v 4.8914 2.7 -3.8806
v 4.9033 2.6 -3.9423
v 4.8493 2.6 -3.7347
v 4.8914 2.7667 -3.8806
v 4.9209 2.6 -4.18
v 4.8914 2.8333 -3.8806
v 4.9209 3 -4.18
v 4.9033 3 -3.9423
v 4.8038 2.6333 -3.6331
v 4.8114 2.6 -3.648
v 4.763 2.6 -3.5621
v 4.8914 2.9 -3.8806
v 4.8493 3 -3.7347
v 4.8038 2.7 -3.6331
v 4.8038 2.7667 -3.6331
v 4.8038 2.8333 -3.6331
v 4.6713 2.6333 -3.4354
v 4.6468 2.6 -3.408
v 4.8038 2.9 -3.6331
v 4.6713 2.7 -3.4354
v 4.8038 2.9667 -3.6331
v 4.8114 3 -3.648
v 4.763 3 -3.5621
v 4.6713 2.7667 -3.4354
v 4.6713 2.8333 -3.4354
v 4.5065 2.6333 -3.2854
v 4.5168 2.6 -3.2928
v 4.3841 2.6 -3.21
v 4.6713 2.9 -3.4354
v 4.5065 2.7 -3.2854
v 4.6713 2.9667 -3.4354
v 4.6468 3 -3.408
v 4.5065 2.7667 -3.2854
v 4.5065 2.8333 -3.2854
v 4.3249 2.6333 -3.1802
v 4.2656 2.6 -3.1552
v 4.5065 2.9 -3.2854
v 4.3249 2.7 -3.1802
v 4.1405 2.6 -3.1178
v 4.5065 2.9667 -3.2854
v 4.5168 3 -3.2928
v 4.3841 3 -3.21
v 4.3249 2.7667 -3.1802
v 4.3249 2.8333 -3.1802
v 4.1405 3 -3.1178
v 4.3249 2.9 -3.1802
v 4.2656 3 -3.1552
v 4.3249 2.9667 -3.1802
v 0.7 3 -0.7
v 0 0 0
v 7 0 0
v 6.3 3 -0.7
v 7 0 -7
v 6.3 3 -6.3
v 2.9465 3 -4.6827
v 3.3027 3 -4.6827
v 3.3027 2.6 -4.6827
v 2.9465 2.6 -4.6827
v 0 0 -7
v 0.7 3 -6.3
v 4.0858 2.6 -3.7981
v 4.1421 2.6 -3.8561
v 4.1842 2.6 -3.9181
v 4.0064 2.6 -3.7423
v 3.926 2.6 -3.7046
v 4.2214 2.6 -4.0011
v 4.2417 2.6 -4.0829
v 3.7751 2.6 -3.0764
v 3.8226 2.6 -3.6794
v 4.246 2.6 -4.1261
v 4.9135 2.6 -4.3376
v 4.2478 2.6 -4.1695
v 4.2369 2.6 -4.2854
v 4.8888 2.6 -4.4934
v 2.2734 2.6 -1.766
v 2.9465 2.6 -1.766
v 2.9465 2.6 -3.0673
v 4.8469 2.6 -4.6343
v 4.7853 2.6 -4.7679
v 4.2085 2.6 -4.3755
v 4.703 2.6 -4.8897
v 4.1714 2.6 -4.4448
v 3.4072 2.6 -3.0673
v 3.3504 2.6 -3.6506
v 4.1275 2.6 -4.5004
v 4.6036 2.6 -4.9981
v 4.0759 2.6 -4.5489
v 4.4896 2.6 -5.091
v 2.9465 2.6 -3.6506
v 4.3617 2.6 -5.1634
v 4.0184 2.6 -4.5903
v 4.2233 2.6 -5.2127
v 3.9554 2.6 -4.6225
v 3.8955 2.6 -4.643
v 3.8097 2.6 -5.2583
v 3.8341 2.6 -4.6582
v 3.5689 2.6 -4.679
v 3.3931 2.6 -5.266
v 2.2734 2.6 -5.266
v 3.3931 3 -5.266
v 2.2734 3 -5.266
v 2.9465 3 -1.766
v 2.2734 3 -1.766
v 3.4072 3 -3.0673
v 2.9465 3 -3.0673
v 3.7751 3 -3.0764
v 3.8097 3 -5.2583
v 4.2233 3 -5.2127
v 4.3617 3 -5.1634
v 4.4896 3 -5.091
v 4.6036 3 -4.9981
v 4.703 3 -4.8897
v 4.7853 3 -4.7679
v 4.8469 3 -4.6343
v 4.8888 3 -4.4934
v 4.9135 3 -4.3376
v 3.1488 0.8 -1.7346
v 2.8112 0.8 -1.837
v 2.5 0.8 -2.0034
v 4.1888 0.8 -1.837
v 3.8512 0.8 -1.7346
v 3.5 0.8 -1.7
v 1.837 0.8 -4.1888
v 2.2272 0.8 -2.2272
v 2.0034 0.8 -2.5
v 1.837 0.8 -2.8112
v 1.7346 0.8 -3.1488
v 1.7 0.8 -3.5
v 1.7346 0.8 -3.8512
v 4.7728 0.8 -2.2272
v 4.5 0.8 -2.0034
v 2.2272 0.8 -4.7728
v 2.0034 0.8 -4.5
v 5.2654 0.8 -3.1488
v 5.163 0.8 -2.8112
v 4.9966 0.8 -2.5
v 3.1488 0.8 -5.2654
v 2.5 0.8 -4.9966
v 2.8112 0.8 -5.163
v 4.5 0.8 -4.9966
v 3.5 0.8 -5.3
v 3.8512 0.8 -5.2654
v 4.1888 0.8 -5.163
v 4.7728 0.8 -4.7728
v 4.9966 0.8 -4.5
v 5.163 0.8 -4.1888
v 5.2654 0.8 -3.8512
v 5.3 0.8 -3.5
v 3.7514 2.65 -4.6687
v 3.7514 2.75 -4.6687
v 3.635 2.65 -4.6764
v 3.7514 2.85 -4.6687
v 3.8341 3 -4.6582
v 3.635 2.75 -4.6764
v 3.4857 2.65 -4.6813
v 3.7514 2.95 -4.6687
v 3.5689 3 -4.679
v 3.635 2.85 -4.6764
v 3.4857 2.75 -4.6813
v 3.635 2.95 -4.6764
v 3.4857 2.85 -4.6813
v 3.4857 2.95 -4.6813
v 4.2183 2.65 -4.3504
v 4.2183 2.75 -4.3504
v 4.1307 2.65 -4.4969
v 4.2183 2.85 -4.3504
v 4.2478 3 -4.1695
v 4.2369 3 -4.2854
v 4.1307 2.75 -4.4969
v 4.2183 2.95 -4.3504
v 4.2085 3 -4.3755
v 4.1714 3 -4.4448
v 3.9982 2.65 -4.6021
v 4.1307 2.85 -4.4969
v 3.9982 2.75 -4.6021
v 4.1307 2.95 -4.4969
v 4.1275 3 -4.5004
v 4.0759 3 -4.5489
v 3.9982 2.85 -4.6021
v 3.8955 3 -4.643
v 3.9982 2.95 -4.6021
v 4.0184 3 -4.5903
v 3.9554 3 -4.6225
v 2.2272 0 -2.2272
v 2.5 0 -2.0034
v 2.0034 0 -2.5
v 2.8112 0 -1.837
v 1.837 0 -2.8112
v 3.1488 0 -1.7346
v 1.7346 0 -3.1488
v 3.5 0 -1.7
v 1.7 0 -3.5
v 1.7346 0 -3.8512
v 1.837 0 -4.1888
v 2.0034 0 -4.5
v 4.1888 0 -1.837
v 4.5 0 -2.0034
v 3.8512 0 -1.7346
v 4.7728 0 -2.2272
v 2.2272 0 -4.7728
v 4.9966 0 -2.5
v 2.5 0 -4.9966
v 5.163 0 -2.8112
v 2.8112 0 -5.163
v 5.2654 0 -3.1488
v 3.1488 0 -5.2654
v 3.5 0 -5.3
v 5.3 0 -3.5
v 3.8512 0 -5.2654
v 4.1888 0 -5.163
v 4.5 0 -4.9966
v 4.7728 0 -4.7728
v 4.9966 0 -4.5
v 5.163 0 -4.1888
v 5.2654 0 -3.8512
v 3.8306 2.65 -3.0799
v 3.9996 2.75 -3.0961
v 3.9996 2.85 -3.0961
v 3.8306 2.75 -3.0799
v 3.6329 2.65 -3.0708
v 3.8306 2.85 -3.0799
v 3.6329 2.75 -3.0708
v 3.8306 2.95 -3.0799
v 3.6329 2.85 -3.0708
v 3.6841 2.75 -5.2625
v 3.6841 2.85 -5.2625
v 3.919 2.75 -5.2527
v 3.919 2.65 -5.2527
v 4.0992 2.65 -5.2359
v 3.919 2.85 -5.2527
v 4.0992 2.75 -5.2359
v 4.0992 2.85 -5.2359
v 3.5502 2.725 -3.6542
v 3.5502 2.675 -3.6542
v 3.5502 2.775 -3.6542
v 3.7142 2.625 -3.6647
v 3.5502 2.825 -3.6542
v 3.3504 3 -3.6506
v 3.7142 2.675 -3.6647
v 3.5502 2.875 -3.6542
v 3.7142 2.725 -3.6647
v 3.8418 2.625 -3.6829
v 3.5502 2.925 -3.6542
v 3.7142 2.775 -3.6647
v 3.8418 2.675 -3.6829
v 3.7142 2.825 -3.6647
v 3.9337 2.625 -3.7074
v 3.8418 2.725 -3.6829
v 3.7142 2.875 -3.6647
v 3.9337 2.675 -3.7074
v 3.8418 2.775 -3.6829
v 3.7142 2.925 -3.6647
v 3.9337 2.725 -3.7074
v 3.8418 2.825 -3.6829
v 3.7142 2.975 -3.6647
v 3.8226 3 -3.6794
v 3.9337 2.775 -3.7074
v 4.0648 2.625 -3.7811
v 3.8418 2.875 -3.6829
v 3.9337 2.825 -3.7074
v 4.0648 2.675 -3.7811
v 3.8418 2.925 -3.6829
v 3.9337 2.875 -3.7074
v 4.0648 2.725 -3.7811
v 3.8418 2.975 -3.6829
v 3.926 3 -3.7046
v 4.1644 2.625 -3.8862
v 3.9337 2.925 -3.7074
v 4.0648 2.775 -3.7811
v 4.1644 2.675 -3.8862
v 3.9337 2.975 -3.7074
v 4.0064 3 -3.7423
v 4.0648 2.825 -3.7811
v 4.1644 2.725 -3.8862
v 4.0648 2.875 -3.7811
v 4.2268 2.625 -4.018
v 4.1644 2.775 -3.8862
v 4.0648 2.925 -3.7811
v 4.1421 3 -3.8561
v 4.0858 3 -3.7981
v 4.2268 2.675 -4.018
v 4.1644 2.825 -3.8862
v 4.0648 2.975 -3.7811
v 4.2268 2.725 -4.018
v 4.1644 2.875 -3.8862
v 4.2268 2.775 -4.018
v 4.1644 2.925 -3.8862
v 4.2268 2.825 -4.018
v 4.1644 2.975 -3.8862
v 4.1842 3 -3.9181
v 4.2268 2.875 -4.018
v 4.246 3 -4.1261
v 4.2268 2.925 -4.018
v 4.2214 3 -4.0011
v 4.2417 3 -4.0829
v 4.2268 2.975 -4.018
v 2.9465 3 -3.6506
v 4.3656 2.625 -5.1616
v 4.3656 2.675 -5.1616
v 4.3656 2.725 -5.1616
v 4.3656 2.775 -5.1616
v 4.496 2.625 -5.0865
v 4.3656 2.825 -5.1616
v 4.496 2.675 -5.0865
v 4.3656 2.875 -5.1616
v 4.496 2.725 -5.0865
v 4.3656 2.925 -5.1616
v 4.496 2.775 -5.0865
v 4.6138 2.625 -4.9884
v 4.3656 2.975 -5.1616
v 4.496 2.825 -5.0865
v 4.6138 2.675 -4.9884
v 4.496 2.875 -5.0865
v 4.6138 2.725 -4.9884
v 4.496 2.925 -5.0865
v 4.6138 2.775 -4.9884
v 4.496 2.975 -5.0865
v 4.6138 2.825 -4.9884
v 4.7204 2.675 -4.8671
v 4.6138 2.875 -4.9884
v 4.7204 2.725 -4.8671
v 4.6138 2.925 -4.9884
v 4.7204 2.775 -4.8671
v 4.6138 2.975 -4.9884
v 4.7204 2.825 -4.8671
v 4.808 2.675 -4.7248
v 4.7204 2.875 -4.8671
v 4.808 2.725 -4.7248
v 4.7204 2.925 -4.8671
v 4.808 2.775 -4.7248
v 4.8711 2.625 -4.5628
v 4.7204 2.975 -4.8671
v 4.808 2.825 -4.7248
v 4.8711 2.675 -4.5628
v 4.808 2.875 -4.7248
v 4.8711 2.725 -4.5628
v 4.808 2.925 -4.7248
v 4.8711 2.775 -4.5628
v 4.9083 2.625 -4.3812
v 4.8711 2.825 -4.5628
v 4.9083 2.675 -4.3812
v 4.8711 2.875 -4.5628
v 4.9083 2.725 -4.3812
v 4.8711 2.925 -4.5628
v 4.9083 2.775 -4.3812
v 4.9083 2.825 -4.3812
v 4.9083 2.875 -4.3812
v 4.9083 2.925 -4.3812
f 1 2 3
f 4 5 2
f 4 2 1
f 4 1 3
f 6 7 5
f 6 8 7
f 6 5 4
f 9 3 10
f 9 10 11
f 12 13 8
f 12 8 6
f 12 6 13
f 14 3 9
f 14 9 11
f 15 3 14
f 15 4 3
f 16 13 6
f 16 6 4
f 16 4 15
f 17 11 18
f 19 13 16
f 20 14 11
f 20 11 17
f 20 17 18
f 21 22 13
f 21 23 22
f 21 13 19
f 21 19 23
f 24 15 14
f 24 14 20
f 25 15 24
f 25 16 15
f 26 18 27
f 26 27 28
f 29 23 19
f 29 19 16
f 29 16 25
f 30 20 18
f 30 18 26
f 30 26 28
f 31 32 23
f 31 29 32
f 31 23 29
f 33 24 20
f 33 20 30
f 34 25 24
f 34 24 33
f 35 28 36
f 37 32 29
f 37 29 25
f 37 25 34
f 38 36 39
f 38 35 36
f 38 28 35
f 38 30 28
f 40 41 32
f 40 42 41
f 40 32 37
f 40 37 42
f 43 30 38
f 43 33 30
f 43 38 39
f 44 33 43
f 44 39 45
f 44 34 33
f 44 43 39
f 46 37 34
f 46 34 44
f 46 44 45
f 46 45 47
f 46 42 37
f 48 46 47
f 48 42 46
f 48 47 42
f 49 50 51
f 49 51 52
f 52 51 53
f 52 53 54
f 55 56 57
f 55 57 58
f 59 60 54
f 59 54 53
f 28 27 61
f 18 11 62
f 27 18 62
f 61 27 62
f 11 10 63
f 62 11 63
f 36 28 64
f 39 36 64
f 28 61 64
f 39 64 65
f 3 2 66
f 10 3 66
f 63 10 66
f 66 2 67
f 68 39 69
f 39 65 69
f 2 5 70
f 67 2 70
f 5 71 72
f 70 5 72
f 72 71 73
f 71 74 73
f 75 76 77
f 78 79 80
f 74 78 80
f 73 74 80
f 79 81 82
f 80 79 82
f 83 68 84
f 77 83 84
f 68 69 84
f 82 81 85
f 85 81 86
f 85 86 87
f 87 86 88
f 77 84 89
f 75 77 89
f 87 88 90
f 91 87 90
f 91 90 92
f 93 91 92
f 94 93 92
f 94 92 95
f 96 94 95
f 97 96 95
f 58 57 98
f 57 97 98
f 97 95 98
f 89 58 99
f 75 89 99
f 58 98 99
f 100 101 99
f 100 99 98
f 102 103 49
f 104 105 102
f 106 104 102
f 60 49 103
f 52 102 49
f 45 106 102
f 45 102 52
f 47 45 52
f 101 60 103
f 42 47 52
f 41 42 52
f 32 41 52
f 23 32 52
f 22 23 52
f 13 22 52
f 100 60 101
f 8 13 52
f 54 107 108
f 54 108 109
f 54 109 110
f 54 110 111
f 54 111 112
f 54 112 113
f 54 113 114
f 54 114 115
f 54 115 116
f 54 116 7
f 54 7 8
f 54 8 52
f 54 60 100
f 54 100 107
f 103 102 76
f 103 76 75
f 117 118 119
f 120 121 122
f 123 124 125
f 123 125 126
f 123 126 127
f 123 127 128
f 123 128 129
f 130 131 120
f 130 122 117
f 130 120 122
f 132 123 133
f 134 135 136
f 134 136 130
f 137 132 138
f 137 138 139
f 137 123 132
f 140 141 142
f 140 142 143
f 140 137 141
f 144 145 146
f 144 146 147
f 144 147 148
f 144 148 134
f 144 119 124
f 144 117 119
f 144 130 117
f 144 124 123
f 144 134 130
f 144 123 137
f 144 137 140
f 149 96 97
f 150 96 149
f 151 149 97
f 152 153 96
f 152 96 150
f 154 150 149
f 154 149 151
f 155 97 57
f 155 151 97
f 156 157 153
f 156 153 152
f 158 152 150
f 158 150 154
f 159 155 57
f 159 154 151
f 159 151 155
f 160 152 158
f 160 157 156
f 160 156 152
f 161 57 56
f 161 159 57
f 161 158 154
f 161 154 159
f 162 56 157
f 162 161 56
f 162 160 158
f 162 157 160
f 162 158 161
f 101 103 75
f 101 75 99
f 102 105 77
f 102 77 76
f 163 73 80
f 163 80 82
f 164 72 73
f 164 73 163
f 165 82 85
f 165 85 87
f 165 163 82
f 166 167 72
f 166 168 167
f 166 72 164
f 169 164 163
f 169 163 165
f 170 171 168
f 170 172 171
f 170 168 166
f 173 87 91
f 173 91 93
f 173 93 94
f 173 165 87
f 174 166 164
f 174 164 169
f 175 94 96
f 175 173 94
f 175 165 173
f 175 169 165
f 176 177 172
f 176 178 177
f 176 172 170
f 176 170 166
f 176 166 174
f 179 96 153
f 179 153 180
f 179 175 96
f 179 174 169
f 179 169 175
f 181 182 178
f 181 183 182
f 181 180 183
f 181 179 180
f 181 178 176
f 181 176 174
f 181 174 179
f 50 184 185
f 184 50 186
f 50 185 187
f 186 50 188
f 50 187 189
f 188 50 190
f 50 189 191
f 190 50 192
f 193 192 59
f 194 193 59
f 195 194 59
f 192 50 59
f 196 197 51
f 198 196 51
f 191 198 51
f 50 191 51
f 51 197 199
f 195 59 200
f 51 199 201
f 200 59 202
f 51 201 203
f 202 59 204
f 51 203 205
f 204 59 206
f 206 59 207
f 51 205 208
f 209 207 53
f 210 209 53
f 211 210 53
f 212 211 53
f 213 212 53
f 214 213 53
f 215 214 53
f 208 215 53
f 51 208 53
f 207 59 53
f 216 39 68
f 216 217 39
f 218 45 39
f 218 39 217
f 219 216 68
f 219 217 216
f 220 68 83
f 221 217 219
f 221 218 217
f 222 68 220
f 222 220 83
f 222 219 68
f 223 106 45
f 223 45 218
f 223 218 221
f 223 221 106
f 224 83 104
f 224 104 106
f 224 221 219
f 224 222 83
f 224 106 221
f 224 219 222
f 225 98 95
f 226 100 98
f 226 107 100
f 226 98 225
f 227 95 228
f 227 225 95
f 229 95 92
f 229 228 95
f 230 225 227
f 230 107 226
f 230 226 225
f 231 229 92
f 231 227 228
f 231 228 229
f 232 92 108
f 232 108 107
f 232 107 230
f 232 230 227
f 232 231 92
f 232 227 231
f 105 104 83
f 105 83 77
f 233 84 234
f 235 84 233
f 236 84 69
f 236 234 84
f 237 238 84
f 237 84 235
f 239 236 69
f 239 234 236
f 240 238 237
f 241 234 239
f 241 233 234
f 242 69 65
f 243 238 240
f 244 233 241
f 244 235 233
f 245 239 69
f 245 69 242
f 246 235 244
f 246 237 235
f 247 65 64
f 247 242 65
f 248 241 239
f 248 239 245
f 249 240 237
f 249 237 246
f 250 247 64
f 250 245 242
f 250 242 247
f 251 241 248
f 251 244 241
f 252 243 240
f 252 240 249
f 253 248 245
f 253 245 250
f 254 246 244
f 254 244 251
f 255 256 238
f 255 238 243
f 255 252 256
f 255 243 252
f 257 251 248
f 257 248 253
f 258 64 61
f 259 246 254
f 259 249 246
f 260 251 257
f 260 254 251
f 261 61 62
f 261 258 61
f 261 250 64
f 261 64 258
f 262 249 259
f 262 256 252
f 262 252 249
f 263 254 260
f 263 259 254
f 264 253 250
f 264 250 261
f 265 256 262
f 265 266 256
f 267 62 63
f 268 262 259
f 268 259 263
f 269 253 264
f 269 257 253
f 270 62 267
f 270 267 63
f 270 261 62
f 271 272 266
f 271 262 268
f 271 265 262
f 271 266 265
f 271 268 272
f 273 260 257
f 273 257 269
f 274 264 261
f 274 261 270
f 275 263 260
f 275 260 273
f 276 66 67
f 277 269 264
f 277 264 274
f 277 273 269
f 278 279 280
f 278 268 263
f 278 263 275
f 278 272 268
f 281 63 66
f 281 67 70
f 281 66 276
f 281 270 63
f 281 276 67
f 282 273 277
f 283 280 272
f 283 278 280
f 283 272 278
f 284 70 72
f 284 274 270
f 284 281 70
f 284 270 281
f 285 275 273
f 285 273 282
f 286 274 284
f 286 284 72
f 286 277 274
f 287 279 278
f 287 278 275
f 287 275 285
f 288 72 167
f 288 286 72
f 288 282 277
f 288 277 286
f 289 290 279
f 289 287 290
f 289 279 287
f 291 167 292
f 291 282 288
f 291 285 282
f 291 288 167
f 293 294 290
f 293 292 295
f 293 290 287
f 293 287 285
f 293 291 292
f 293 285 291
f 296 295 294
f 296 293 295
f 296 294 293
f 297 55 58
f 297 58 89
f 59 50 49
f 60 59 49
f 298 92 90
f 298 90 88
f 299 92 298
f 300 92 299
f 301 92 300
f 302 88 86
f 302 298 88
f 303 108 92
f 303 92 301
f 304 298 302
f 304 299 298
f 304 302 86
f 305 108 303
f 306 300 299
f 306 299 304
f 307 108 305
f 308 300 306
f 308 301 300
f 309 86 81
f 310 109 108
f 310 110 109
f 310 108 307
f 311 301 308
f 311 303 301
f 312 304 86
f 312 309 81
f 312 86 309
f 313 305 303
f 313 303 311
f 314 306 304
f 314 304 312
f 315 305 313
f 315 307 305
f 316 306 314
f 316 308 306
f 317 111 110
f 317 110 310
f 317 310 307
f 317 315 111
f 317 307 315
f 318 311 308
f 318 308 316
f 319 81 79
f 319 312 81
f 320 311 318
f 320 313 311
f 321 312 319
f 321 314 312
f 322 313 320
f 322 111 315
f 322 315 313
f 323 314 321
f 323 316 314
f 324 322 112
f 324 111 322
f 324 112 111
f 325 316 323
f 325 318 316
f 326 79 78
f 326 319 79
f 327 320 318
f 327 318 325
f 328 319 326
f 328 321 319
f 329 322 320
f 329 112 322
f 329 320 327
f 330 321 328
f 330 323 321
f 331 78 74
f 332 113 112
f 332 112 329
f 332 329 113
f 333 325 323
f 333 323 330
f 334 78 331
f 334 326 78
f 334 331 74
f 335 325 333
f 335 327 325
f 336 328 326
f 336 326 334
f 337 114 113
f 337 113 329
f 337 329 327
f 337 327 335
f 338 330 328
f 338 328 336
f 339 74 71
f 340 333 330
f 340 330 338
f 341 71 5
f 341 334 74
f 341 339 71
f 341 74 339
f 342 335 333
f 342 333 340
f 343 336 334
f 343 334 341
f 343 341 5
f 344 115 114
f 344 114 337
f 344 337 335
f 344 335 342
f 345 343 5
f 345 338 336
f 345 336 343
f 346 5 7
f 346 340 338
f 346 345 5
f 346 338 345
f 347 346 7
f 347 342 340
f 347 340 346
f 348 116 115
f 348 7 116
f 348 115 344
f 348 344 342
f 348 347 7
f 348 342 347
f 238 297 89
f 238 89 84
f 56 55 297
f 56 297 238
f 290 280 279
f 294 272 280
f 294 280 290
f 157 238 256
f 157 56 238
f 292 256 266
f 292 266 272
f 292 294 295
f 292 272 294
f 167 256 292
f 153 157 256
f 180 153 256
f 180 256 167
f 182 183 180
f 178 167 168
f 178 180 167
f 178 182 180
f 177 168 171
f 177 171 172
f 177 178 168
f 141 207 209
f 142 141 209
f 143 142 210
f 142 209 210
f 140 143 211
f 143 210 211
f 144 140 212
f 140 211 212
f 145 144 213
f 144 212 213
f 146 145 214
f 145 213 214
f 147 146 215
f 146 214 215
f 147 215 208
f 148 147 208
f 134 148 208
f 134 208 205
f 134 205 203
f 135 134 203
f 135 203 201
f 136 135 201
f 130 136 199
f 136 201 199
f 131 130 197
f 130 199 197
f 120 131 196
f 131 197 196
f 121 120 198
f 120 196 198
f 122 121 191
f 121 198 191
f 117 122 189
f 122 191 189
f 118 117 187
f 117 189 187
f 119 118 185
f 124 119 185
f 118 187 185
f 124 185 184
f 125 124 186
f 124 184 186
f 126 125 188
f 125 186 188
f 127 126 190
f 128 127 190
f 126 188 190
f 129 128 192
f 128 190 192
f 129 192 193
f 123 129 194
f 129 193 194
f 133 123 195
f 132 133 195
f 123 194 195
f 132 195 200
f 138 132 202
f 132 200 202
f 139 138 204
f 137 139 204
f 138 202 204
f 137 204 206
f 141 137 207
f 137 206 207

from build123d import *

# Parameters (mm, degrees)
SKETCH1_W           = 7
SKETCH1_H           = 7
BOSS_EXTRUDE1_DEPTH = 3
CUT_EXTRUDE1_DEPTH  = 7
CUT_EXTRUDE2_DEPTH  = 11
SKETCH4_R           = 1.8
CUT_EXTRUDE3_DEPTH  = 0.8
CUT_EXTRUDE4_DEPTH  = 0.4


with BuildPart() as part:
    # Sketch1 → Boss-Extrude1 (new body)
    with BuildSketch(Plane(origin=(0, 0, 0), x_dir=(1, 0, 0), z_dir=(0, 1, 0))):
        with Locations((3.5, 3.5)):
            Rectangle(SKETCH1_W, SKETCH1_H)
    extrude(amount=BOSS_EXTRUDE1_DEPTH)

    # Sketch2 → Cut-Extrude1 (cut)
    with BuildSketch(Plane.XY):
        Polygon((0, 0), (0.7, 3), (0, 3), align=None)
        Polygon((7, 0), (6.3, 3), (7, 3), align=None)
    extrude(amount=-CUT_EXTRUDE1_DEPTH, mode=Mode.SUBTRACT)

    # Sketch3 → Cut-Extrude2 (cut)
    with BuildSketch(Plane(origin=(0, 0, 0), x_dir=(0, 0, -1), z_dir=(1, 0, 0))):
        Polygon((0, 0), (0.7, 3), (0, 3), align=None)
        Polygon((7, 3), (6.3, 3), (7, 0), align=None)
    extrude(amount=CUT_EXTRUDE2_DEPTH, mode=Mode.SUBTRACT)

    # Sketch4 → Cut-Extrude3 (cut)
    with BuildSketch(Plane.XZ):
        with Locations(Location((3.5, -3.5, 0), (0, 0, 270))):
            Circle(SKETCH4_R)
    extrude(amount=-CUT_EXTRUDE3_DEPTH, mode=Mode.SUBTRACT)

    # Sketch5 → Cut-Extrude4 (cut)
    with BuildSketch(Plane(origin=(0, 3, 0), x_dir=(1, 0, 0), z_dir=(0, 1, 0))):
        with BuildLine():
            Line((2.273436966, 1.766029319), (2.273436966, 5.266029319))
            Line((2.273436966, 5.266029319), (3.393128472, 5.266029319))
            add(Edge.make_bspline(
                [(3.393128472, 5.266029319), (3.443844607, 5.265973935), (3.540845243, 5.265868005), (3.679210782, 5.262924846), (3.803788221, 5.25875848), (3.914392667, 5.253569447), (4.011413307, 5.245826414), (4.094414918, 5.236860098), (4.163920155, 5.227214721), (4.20484973, 5.217233046), (4.223256678, 5.212744063)],
                knots=[0, 0, 0, 0, 1.460485487, 2.793352117, 3.985295279, 5.050041172, 5.981765236, 6.787433016, 7.454681457, 8, 8, 8, 8], degree=3))
            add(Edge.make_bspline(
                [(4.223256678, 5.212744063), (4.247733441, 5.205764794), (4.296314082, 5.191912581), (4.365914991, 5.162381864), (4.432999247, 5.128157338), (4.496724006, 5.087367889), (4.55730589, 5.040737674), (4.614924976, 4.988646969), (4.669888538, 4.930860625), (4.721436225, 4.867492795), (4.768647843, 4.798863014), (4.809450543, 4.724869813), (4.843634674, 4.645834805), (4.872758986, 4.562351928), (4.894247042, 4.473526111), (4.909284774, 4.379974525), (4.919752913, 4.281656252), (4.920494089, 4.214375246), (4.920872863, 4.179991659)],
                knots=[0, 0, 0, 0, 0.907145743, 1.80047177, 2.69161667, 3.591261238, 4.495029544, 5.415863088, 6.359363025, 7.337192411, 8.326890979, 9.326929023, 10.346104993, 11.395420813, 12.477187422, 13.601053412, 14.774031606, 16, 16, 16, 16], degree=3))
            add(Edge.make_bspline(
                [(4.920872863, 4.179991659), (4.919792601, 4.127776273), (4.917713038, 4.027258789), (4.894446409, 3.883154793), (4.858959078, 3.751525082), (4.807091778, 3.633637523), (4.743854765, 3.529029507), (4.674197894, 3.434725874), (4.594659983, 3.353569033), (4.508726287, 3.284249259), (4.417910076, 3.227520832), (4.326929468, 3.179160654), (4.234556815, 3.141979803), (4.171577346, 3.125779808), (4.140524306, 3.11779214)],
                knots=[0, 0, 0, 0, 1.312386234, 2.526415563, 3.661883817, 4.733421185, 5.753802465, 6.732107337, 7.675884281, 8.604170108, 9.50284679, 10.365392406, 11.194030444, 12, 12, 12, 12], degree=3))
            add(Edge.make_bspline(
                [(4.140524306, 3.11779214), (4.118360169, 3.113576), (4.071640813, 3.10468888), (3.997546708, 3.09583004), (3.916557837, 3.086024269), (3.828341085, 3.079628394), (3.733003173, 3.073638926), (3.63058112, 3.0708111), (3.521221299, 3.067404144), (3.44594969, 3.067342926), (3.407150908, 3.06731137)],
                knots=[0, 0, 0, 0, 0.735353946, 1.55003838, 2.431865514, 3.394945452, 4.432993119, 5.54609699, 6.735134699, 8, 8, 8, 8], degree=3))
            Line((3.407150908, 3.06731137), (2.946513889, 3.06731137))
            Line((2.946513889, 3.06731137), (2.946513889, 1.766029319))
            Line((2.946513889, 1.766029319), (2.273436966, 1.766029319))
        make_face()
        with BuildLine():
            Line((2.946513889, 4.682695986), (2.946513889, 3.650644704))
            Line((2.946513889, 3.650644704), (3.350360043, 3.650644704))
            add(Edge.make_bspline(
                [(3.350360043, 3.650644704), (3.385185484, 3.6506898), (3.451810934, 3.650776074), (3.547403676, 3.653872817), (3.633934317, 3.657652965), (3.711583659, 3.663909885), (3.779882991, 3.672156355), (3.839289696, 3.682020172), (3.889873011, 3.692605078), (3.94457198, 3.710145964), (4.003056114, 3.738525517), (4.065510296, 3.779314064), (4.120376221, 3.828081582), (4.166031944, 3.885357343), (4.202500757, 3.948994033), (4.228612454, 4.01833948), (4.245472753, 4.092244389), (4.247012787, 4.143440235), (4.24779594, 4.169474832)],
                knots=[0, 0, 0, 0, 1.411705958, 2.700771114, 3.876961699, 4.922619712, 5.858038221, 6.66485904, 7.363650596, 7.950905807, 8.989198271, 9.987739806, 10.967313358, 11.951275539, 12.944273208, 13.927870418, 14.946261014, 16, 16, 16, 16], degree=3))
            add(Edge.make_bspline(
                [(4.24779594, 4.169474832), (4.246693738, 4.201184565), (4.244556714, 4.262665556), (4.220991303, 4.350224748), (4.184632567, 4.429685776), (4.132649896, 4.498576249), (4.069856053, 4.556507472), (3.999278394, 4.604708309), (3.919409702, 4.638439621), (3.862884076, 4.65150926), (3.834134081, 4.658156723)],
                knots=[0, 0, 0, 0, 1.085904563, 2.105425768, 3.088705091, 4.068969419, 5.045188284, 6.010769642, 6.988240112, 8, 8, 8, 8], degree=3))
            add(Edge.make_bspline(
                [(3.834134081, 4.658156723), (3.821762302, 4.660135488), (3.794300788, 4.664527734), (3.748654162, 4.669111588), (3.694654197, 4.673280599), (3.6322358, 4.676703481), (3.561646383, 4.679379383), (3.482653109, 4.681724132), (3.395464024, 4.681912502), (3.334467378, 4.682427589), (3.302683761, 4.682695986)],
                knots=[0, 0, 0, 0, 0.564603001, 1.253243608, 2.066786758, 3.005752288, 4.070476343, 5.250658742, 6.567396469, 8, 8, 8, 8], degree=3))
            Line((3.302683761, 4.682695986), (2.946513889, 4.682695986))
        make_face(mode=Mode.SUBTRACT)
    extrude(amount=-CUT_EXTRUDE4_DEPTH, mode=Mode.SUBTRACT)


solid = part.part
